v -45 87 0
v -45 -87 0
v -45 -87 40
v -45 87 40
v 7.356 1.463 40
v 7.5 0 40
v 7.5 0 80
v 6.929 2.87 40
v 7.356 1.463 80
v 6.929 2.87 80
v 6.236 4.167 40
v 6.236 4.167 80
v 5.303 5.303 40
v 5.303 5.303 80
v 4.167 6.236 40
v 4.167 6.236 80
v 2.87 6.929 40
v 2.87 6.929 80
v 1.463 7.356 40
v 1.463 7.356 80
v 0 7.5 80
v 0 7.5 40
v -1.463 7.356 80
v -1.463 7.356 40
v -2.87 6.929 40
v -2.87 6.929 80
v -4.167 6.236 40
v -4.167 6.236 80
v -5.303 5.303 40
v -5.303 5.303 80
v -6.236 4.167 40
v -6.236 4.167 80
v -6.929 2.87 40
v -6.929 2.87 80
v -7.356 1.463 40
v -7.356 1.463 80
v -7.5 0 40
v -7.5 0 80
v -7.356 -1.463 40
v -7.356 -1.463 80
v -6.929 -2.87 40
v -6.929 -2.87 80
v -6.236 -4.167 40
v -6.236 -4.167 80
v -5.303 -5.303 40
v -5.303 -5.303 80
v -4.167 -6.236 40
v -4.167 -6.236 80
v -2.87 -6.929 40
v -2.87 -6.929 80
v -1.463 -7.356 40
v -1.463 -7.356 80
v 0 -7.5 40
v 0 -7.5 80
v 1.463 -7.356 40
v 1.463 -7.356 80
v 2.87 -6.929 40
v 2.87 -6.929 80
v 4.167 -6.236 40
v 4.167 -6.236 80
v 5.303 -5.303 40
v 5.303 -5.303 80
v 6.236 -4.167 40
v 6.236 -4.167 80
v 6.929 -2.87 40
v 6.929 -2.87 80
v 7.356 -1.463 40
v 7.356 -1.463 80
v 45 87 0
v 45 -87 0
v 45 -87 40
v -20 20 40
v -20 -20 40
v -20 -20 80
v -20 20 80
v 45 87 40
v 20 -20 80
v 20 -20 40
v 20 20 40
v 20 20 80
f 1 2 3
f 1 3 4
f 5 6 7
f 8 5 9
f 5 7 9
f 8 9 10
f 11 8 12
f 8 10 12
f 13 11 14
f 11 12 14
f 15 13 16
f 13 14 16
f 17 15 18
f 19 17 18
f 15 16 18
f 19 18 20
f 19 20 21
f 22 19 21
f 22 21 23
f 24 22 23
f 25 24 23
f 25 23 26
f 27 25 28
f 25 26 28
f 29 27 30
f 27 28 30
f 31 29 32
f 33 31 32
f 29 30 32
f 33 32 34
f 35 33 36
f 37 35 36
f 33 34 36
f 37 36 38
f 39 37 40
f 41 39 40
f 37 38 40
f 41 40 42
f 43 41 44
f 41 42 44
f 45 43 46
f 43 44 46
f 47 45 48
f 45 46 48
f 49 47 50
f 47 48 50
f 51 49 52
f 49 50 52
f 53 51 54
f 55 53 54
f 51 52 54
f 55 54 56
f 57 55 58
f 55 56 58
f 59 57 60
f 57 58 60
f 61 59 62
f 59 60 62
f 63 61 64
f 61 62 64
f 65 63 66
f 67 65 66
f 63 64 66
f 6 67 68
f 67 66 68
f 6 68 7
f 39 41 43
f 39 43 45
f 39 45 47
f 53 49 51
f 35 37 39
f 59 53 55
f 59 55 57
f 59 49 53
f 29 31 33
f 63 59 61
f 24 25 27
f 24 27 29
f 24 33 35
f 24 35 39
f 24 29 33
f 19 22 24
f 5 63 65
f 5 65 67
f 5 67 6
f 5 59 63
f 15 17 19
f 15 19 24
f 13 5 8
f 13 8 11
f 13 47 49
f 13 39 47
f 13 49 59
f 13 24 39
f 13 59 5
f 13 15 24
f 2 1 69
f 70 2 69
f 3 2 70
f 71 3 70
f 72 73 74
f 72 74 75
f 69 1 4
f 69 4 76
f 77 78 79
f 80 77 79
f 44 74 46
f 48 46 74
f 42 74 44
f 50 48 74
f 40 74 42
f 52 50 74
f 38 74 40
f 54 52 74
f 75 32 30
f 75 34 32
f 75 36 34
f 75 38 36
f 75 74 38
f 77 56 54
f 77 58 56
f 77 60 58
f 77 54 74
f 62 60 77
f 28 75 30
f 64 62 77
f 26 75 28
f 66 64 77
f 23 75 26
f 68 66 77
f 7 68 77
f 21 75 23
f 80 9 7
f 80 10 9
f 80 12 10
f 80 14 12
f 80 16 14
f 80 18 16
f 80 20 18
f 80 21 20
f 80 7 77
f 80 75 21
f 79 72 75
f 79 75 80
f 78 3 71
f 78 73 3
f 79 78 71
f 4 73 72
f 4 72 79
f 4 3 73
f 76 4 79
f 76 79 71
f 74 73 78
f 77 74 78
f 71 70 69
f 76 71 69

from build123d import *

# Parameters (mm, degrees)
SKETCH_1_W          = 90
SKETCH_1_H          = 174
EXTRUDE_1_DEPTH     = 40
SKETCH_2_W          = 40
SKETCH_2_H          = 40
EXTRUDE_2_DEPTH     = 40
SKETCH_3_R          = 7.5
CUT_EXTRUDE_1_DEPTH = 40


with BuildPart() as part:
    # 草图1 → 凸台-拉伸1 (new body)
    with BuildSketch(Plane.XY):
        Rectangle(SKETCH_1_W, SKETCH_1_H)
    extrude(amount=EXTRUDE_1_DEPTH)

    # 草图2 → 凸台-拉伸2 (add)
    with BuildSketch(Plane.XY.offset(40)):
        Rectangle(SKETCH_2_W, SKETCH_2_H)
    extrude(amount=EXTRUDE_2_DEPTH)

    # 草图3 → 切除-拉伸1 (cut)
    with BuildSketch(Plane.XY.offset(80)):
        Circle(SKETCH_3_R)
    extrude(amount=-CUT_EXTRUDE_1_DEPTH, mode=Mode.SUBTRACT)


solid = part.part
